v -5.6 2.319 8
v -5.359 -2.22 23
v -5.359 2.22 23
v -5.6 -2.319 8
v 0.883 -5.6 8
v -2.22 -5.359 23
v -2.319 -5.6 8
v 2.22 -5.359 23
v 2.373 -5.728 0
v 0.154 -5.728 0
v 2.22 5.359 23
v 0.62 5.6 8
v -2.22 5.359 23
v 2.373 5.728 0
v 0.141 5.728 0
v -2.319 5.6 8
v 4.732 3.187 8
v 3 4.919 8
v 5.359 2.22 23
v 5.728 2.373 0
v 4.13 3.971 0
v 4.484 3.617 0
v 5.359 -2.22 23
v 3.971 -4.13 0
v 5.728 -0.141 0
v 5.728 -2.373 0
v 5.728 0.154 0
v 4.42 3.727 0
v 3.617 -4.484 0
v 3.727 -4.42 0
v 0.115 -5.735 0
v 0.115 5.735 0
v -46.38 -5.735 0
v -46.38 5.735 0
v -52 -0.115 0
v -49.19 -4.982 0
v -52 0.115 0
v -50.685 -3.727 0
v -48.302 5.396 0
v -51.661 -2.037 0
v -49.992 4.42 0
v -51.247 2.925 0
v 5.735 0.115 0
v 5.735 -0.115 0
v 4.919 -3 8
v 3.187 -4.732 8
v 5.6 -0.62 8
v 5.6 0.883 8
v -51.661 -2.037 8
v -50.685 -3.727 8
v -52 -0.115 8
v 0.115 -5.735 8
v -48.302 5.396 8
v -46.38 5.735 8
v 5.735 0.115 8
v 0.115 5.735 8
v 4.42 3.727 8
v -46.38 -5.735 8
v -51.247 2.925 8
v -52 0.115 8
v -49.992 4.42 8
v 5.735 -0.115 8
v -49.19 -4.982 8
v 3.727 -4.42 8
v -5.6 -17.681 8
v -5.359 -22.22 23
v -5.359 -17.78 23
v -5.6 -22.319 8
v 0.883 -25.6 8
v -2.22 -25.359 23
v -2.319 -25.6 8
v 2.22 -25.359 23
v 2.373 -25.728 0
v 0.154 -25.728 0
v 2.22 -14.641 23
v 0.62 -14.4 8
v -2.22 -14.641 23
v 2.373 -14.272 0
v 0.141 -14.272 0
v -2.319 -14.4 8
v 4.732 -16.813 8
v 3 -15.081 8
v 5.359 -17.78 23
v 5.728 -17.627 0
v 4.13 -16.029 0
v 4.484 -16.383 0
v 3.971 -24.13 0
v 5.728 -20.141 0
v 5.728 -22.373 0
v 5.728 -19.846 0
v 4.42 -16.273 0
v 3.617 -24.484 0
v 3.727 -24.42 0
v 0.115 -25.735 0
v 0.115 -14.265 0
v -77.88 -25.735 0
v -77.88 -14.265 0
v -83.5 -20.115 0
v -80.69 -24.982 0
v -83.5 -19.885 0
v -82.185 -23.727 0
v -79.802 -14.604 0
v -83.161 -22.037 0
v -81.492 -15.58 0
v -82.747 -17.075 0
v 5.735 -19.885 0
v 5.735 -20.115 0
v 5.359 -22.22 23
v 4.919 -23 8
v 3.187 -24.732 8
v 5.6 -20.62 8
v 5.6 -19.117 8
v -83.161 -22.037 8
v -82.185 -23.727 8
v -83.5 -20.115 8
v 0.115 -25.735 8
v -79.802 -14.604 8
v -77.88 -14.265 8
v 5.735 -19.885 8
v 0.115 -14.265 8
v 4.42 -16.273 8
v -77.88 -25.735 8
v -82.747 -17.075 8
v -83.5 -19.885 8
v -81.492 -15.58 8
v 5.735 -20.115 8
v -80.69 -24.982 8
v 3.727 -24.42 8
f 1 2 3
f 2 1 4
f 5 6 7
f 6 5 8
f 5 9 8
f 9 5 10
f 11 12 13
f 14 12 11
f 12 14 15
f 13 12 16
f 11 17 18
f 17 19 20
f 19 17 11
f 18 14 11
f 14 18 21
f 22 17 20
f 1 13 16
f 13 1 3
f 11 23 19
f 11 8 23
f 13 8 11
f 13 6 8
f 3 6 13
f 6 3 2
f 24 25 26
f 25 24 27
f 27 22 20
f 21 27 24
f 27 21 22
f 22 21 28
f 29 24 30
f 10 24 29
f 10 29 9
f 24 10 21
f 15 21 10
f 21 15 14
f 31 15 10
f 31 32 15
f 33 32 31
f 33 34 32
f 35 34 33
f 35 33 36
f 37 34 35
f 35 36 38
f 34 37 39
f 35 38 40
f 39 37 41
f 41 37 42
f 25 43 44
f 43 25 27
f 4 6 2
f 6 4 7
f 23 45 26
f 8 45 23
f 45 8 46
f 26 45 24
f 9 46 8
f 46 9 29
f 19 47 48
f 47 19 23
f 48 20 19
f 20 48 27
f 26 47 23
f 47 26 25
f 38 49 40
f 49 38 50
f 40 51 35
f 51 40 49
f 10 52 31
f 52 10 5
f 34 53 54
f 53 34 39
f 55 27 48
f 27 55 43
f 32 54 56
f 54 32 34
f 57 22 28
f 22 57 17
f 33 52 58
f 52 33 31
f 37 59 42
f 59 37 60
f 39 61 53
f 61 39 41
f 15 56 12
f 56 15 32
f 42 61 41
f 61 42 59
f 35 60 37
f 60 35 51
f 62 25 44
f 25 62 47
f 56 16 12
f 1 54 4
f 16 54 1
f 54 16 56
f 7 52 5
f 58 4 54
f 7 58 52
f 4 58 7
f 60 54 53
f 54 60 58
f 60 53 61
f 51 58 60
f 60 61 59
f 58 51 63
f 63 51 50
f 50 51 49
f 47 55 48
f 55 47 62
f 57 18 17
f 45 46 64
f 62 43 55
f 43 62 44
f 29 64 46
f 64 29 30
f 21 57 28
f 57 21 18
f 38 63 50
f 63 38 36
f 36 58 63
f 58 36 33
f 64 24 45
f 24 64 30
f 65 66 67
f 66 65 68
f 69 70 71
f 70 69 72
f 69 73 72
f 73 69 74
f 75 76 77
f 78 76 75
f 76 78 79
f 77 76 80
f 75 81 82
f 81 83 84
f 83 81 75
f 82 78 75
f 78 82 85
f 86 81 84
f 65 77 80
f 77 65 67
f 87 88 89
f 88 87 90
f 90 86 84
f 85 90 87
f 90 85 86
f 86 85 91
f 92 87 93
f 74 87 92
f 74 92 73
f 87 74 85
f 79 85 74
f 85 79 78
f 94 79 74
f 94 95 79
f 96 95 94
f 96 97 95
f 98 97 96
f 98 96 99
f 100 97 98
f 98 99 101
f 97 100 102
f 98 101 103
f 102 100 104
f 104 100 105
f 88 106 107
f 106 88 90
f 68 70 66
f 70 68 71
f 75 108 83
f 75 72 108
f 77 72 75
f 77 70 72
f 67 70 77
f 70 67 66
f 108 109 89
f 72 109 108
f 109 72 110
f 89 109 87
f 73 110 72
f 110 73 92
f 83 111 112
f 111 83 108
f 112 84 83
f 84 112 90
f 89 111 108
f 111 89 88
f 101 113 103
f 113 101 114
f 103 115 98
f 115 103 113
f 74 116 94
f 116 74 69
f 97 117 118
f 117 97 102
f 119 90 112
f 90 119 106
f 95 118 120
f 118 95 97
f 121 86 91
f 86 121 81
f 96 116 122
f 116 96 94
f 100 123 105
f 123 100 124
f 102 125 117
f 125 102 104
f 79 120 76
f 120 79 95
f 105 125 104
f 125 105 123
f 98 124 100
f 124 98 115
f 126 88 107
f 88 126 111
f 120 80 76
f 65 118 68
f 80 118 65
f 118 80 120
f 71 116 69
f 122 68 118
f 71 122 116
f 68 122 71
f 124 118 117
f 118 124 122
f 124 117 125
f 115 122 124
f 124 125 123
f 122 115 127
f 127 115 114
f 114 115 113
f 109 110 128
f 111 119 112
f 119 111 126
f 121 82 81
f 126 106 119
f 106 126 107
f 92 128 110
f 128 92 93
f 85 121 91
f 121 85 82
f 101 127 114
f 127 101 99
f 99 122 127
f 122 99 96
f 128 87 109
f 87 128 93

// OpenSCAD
laser_x = 181;
laser_y = 116+2; //screws back

holder_h=15;

t=3;

holder_insert_h_raw=12;
holder_insert_h=holder_insert_h_raw + t;

holder_rot_n=8;

d_raw = (holder_h+t);
d = (d_raw)*1.08;

inner_d = 12;
inner_d_tol=0.4;

dmx_cut_d=30;
dmx_x_off=33;
dmx_y_off=20;

leg_t=8;

holder_xy_off=d_raw/2;
holder_x_gap = t+laser_x+t-2*holder_xy_off;
holder_y_gap = t+laser_y+t-2*holder_xy_off;

// box();
// translate([holder_xy_off+holder_x_gap,-20,0])
// leg(is_side_x=true);
// translate([holder_xy_off,-20,0])
// rotate([0,0,180])
// leg(is_side_x=true);

// rotate([90,0,0])
leg(is_side_x=false);
translate([0,-20,0])
leg(is_side_x=true);

module leg(is_side_x=true){
  leg_gap=1;
  leg_plus=.8;
  w=inner_d-inner_d_tol+leg_plus;
  
  // translate([t+dmx_x_off, t+laser_y, t+dmx_y_off])
  // rotate([90,0,0])
  l = is_side_x ? holder_x_gap/2-leg_gap : holder_y_gap/2-leg_gap;
  // translate([0,0,leg_t])
  #rotate([0,0,360/holder_rot_n/2,0])
  cylinder(h=holder_insert_h+leg_t,d1=w, d2=w-leg_plus,$fn=holder_rot_n, center=false);
  
  w_adj = w*.925;
  linear_extrude(height=leg_t)
  // translate([-l/2+w_adj/2,0,0])
  translate([-l,0,0])
  translate([0,-w_adj/2,0])
  offset(w_adj*.49)
  offset(-w_adj*.49)
  square([l+w_adj/2,w_adj], center=false);
}

module box(){
difference(){
  union(){
    box_raw();
    holder_insert(side=0);
    holder_insert(side=1);
    holder_insert(side=2);
    holder_insert(side=3);
    holder_insert(side=4);
    holder_insert(side=5);
    holder_insert(side=6);
    holder_insert(side=7);
  }
  holder_insert(side=0, is_inner=1);
  holder_insert(side=1, is_inner=1);
  holder_insert(side=2, is_inner=1);
  holder_insert(side=3, is_inner=1);
  holder_insert(side=4, is_inner=1);
  holder_insert(side=5, is_inner=1);
  holder_insert(side=6, is_inner=1);
  holder_insert(side=7, is_inner=1);

  translate([t+dmx_x_off, t+laser_y, t+dmx_y_off])
  rotate([90,0,0])
  #cylinder(h=2*t,d=dmx_cut_d,$fn=100, center=true);
  }
}



module holder_insert(side=0, is_inner=0){
  if(side==0){
    translate([holder_xy_off, t, 0])
    holder_insert_raw(is_inner);
  }
  if(side==1){
    translate([holder_xy_off+holder_x_gap , t, 0])
    holder_insert_raw(is_inner);
  }
  if(side==2){
    translate([holder_xy_off, laser_y+holder_insert_h+t, 0])
    holder_insert_raw(is_inner);
  }
  if(side==3){
    translate([holder_xy_off+holder_x_gap, laser_y+holder_insert_h+t, 0])
    holder_insert_raw(is_inner);
  }
  if(side==4){
    translate([t, d_raw/2, 0])
    rotate([0,0,-90])
    holder_insert_raw(is_inner);
  }
  if(side==5){
    translate([t+laser_x, d_raw/2, 0])
    rotate([0,0,90])
    holder_insert_raw(is_inner);
  }
  if(side==6){
    translate([t, holder_y_gap + holder_xy_off, 0])
    rotate([0,0,-90])
    holder_insert_raw(is_inner);
  }
  if(side==7){
    translate([t+laser_x, holder_y_gap + holder_xy_off, 0])
    rotate([0,0,90])
    holder_insert_raw(is_inner);
  }
}
module holder_insert_raw(is_inner=0){

  // translate([(holder_h+t)/2, 0, 0])
  translate([0, 0, (holder_h+t)/2])
  rotate([90,360/holder_rot_n/2,0])
  if(is_inner==1){
    cylinder(h=holder_insert_h, d=inner_d, $fn=holder_rot_n);
  }else{
    cylinder(h=holder_insert_h, d=d, $fn=holder_rot_n);
  }
}

module box_raw(){
  difference(){
    outer_box();
    translate([t,t,t])
    #inner_box();
  }
}

module inner_box(){
  cube([laser_x,laser_y,holder_h]);
}


module outer_box(){
  cube([laser_x+2*t,laser_y+2*t,holder_h+t]);
}
